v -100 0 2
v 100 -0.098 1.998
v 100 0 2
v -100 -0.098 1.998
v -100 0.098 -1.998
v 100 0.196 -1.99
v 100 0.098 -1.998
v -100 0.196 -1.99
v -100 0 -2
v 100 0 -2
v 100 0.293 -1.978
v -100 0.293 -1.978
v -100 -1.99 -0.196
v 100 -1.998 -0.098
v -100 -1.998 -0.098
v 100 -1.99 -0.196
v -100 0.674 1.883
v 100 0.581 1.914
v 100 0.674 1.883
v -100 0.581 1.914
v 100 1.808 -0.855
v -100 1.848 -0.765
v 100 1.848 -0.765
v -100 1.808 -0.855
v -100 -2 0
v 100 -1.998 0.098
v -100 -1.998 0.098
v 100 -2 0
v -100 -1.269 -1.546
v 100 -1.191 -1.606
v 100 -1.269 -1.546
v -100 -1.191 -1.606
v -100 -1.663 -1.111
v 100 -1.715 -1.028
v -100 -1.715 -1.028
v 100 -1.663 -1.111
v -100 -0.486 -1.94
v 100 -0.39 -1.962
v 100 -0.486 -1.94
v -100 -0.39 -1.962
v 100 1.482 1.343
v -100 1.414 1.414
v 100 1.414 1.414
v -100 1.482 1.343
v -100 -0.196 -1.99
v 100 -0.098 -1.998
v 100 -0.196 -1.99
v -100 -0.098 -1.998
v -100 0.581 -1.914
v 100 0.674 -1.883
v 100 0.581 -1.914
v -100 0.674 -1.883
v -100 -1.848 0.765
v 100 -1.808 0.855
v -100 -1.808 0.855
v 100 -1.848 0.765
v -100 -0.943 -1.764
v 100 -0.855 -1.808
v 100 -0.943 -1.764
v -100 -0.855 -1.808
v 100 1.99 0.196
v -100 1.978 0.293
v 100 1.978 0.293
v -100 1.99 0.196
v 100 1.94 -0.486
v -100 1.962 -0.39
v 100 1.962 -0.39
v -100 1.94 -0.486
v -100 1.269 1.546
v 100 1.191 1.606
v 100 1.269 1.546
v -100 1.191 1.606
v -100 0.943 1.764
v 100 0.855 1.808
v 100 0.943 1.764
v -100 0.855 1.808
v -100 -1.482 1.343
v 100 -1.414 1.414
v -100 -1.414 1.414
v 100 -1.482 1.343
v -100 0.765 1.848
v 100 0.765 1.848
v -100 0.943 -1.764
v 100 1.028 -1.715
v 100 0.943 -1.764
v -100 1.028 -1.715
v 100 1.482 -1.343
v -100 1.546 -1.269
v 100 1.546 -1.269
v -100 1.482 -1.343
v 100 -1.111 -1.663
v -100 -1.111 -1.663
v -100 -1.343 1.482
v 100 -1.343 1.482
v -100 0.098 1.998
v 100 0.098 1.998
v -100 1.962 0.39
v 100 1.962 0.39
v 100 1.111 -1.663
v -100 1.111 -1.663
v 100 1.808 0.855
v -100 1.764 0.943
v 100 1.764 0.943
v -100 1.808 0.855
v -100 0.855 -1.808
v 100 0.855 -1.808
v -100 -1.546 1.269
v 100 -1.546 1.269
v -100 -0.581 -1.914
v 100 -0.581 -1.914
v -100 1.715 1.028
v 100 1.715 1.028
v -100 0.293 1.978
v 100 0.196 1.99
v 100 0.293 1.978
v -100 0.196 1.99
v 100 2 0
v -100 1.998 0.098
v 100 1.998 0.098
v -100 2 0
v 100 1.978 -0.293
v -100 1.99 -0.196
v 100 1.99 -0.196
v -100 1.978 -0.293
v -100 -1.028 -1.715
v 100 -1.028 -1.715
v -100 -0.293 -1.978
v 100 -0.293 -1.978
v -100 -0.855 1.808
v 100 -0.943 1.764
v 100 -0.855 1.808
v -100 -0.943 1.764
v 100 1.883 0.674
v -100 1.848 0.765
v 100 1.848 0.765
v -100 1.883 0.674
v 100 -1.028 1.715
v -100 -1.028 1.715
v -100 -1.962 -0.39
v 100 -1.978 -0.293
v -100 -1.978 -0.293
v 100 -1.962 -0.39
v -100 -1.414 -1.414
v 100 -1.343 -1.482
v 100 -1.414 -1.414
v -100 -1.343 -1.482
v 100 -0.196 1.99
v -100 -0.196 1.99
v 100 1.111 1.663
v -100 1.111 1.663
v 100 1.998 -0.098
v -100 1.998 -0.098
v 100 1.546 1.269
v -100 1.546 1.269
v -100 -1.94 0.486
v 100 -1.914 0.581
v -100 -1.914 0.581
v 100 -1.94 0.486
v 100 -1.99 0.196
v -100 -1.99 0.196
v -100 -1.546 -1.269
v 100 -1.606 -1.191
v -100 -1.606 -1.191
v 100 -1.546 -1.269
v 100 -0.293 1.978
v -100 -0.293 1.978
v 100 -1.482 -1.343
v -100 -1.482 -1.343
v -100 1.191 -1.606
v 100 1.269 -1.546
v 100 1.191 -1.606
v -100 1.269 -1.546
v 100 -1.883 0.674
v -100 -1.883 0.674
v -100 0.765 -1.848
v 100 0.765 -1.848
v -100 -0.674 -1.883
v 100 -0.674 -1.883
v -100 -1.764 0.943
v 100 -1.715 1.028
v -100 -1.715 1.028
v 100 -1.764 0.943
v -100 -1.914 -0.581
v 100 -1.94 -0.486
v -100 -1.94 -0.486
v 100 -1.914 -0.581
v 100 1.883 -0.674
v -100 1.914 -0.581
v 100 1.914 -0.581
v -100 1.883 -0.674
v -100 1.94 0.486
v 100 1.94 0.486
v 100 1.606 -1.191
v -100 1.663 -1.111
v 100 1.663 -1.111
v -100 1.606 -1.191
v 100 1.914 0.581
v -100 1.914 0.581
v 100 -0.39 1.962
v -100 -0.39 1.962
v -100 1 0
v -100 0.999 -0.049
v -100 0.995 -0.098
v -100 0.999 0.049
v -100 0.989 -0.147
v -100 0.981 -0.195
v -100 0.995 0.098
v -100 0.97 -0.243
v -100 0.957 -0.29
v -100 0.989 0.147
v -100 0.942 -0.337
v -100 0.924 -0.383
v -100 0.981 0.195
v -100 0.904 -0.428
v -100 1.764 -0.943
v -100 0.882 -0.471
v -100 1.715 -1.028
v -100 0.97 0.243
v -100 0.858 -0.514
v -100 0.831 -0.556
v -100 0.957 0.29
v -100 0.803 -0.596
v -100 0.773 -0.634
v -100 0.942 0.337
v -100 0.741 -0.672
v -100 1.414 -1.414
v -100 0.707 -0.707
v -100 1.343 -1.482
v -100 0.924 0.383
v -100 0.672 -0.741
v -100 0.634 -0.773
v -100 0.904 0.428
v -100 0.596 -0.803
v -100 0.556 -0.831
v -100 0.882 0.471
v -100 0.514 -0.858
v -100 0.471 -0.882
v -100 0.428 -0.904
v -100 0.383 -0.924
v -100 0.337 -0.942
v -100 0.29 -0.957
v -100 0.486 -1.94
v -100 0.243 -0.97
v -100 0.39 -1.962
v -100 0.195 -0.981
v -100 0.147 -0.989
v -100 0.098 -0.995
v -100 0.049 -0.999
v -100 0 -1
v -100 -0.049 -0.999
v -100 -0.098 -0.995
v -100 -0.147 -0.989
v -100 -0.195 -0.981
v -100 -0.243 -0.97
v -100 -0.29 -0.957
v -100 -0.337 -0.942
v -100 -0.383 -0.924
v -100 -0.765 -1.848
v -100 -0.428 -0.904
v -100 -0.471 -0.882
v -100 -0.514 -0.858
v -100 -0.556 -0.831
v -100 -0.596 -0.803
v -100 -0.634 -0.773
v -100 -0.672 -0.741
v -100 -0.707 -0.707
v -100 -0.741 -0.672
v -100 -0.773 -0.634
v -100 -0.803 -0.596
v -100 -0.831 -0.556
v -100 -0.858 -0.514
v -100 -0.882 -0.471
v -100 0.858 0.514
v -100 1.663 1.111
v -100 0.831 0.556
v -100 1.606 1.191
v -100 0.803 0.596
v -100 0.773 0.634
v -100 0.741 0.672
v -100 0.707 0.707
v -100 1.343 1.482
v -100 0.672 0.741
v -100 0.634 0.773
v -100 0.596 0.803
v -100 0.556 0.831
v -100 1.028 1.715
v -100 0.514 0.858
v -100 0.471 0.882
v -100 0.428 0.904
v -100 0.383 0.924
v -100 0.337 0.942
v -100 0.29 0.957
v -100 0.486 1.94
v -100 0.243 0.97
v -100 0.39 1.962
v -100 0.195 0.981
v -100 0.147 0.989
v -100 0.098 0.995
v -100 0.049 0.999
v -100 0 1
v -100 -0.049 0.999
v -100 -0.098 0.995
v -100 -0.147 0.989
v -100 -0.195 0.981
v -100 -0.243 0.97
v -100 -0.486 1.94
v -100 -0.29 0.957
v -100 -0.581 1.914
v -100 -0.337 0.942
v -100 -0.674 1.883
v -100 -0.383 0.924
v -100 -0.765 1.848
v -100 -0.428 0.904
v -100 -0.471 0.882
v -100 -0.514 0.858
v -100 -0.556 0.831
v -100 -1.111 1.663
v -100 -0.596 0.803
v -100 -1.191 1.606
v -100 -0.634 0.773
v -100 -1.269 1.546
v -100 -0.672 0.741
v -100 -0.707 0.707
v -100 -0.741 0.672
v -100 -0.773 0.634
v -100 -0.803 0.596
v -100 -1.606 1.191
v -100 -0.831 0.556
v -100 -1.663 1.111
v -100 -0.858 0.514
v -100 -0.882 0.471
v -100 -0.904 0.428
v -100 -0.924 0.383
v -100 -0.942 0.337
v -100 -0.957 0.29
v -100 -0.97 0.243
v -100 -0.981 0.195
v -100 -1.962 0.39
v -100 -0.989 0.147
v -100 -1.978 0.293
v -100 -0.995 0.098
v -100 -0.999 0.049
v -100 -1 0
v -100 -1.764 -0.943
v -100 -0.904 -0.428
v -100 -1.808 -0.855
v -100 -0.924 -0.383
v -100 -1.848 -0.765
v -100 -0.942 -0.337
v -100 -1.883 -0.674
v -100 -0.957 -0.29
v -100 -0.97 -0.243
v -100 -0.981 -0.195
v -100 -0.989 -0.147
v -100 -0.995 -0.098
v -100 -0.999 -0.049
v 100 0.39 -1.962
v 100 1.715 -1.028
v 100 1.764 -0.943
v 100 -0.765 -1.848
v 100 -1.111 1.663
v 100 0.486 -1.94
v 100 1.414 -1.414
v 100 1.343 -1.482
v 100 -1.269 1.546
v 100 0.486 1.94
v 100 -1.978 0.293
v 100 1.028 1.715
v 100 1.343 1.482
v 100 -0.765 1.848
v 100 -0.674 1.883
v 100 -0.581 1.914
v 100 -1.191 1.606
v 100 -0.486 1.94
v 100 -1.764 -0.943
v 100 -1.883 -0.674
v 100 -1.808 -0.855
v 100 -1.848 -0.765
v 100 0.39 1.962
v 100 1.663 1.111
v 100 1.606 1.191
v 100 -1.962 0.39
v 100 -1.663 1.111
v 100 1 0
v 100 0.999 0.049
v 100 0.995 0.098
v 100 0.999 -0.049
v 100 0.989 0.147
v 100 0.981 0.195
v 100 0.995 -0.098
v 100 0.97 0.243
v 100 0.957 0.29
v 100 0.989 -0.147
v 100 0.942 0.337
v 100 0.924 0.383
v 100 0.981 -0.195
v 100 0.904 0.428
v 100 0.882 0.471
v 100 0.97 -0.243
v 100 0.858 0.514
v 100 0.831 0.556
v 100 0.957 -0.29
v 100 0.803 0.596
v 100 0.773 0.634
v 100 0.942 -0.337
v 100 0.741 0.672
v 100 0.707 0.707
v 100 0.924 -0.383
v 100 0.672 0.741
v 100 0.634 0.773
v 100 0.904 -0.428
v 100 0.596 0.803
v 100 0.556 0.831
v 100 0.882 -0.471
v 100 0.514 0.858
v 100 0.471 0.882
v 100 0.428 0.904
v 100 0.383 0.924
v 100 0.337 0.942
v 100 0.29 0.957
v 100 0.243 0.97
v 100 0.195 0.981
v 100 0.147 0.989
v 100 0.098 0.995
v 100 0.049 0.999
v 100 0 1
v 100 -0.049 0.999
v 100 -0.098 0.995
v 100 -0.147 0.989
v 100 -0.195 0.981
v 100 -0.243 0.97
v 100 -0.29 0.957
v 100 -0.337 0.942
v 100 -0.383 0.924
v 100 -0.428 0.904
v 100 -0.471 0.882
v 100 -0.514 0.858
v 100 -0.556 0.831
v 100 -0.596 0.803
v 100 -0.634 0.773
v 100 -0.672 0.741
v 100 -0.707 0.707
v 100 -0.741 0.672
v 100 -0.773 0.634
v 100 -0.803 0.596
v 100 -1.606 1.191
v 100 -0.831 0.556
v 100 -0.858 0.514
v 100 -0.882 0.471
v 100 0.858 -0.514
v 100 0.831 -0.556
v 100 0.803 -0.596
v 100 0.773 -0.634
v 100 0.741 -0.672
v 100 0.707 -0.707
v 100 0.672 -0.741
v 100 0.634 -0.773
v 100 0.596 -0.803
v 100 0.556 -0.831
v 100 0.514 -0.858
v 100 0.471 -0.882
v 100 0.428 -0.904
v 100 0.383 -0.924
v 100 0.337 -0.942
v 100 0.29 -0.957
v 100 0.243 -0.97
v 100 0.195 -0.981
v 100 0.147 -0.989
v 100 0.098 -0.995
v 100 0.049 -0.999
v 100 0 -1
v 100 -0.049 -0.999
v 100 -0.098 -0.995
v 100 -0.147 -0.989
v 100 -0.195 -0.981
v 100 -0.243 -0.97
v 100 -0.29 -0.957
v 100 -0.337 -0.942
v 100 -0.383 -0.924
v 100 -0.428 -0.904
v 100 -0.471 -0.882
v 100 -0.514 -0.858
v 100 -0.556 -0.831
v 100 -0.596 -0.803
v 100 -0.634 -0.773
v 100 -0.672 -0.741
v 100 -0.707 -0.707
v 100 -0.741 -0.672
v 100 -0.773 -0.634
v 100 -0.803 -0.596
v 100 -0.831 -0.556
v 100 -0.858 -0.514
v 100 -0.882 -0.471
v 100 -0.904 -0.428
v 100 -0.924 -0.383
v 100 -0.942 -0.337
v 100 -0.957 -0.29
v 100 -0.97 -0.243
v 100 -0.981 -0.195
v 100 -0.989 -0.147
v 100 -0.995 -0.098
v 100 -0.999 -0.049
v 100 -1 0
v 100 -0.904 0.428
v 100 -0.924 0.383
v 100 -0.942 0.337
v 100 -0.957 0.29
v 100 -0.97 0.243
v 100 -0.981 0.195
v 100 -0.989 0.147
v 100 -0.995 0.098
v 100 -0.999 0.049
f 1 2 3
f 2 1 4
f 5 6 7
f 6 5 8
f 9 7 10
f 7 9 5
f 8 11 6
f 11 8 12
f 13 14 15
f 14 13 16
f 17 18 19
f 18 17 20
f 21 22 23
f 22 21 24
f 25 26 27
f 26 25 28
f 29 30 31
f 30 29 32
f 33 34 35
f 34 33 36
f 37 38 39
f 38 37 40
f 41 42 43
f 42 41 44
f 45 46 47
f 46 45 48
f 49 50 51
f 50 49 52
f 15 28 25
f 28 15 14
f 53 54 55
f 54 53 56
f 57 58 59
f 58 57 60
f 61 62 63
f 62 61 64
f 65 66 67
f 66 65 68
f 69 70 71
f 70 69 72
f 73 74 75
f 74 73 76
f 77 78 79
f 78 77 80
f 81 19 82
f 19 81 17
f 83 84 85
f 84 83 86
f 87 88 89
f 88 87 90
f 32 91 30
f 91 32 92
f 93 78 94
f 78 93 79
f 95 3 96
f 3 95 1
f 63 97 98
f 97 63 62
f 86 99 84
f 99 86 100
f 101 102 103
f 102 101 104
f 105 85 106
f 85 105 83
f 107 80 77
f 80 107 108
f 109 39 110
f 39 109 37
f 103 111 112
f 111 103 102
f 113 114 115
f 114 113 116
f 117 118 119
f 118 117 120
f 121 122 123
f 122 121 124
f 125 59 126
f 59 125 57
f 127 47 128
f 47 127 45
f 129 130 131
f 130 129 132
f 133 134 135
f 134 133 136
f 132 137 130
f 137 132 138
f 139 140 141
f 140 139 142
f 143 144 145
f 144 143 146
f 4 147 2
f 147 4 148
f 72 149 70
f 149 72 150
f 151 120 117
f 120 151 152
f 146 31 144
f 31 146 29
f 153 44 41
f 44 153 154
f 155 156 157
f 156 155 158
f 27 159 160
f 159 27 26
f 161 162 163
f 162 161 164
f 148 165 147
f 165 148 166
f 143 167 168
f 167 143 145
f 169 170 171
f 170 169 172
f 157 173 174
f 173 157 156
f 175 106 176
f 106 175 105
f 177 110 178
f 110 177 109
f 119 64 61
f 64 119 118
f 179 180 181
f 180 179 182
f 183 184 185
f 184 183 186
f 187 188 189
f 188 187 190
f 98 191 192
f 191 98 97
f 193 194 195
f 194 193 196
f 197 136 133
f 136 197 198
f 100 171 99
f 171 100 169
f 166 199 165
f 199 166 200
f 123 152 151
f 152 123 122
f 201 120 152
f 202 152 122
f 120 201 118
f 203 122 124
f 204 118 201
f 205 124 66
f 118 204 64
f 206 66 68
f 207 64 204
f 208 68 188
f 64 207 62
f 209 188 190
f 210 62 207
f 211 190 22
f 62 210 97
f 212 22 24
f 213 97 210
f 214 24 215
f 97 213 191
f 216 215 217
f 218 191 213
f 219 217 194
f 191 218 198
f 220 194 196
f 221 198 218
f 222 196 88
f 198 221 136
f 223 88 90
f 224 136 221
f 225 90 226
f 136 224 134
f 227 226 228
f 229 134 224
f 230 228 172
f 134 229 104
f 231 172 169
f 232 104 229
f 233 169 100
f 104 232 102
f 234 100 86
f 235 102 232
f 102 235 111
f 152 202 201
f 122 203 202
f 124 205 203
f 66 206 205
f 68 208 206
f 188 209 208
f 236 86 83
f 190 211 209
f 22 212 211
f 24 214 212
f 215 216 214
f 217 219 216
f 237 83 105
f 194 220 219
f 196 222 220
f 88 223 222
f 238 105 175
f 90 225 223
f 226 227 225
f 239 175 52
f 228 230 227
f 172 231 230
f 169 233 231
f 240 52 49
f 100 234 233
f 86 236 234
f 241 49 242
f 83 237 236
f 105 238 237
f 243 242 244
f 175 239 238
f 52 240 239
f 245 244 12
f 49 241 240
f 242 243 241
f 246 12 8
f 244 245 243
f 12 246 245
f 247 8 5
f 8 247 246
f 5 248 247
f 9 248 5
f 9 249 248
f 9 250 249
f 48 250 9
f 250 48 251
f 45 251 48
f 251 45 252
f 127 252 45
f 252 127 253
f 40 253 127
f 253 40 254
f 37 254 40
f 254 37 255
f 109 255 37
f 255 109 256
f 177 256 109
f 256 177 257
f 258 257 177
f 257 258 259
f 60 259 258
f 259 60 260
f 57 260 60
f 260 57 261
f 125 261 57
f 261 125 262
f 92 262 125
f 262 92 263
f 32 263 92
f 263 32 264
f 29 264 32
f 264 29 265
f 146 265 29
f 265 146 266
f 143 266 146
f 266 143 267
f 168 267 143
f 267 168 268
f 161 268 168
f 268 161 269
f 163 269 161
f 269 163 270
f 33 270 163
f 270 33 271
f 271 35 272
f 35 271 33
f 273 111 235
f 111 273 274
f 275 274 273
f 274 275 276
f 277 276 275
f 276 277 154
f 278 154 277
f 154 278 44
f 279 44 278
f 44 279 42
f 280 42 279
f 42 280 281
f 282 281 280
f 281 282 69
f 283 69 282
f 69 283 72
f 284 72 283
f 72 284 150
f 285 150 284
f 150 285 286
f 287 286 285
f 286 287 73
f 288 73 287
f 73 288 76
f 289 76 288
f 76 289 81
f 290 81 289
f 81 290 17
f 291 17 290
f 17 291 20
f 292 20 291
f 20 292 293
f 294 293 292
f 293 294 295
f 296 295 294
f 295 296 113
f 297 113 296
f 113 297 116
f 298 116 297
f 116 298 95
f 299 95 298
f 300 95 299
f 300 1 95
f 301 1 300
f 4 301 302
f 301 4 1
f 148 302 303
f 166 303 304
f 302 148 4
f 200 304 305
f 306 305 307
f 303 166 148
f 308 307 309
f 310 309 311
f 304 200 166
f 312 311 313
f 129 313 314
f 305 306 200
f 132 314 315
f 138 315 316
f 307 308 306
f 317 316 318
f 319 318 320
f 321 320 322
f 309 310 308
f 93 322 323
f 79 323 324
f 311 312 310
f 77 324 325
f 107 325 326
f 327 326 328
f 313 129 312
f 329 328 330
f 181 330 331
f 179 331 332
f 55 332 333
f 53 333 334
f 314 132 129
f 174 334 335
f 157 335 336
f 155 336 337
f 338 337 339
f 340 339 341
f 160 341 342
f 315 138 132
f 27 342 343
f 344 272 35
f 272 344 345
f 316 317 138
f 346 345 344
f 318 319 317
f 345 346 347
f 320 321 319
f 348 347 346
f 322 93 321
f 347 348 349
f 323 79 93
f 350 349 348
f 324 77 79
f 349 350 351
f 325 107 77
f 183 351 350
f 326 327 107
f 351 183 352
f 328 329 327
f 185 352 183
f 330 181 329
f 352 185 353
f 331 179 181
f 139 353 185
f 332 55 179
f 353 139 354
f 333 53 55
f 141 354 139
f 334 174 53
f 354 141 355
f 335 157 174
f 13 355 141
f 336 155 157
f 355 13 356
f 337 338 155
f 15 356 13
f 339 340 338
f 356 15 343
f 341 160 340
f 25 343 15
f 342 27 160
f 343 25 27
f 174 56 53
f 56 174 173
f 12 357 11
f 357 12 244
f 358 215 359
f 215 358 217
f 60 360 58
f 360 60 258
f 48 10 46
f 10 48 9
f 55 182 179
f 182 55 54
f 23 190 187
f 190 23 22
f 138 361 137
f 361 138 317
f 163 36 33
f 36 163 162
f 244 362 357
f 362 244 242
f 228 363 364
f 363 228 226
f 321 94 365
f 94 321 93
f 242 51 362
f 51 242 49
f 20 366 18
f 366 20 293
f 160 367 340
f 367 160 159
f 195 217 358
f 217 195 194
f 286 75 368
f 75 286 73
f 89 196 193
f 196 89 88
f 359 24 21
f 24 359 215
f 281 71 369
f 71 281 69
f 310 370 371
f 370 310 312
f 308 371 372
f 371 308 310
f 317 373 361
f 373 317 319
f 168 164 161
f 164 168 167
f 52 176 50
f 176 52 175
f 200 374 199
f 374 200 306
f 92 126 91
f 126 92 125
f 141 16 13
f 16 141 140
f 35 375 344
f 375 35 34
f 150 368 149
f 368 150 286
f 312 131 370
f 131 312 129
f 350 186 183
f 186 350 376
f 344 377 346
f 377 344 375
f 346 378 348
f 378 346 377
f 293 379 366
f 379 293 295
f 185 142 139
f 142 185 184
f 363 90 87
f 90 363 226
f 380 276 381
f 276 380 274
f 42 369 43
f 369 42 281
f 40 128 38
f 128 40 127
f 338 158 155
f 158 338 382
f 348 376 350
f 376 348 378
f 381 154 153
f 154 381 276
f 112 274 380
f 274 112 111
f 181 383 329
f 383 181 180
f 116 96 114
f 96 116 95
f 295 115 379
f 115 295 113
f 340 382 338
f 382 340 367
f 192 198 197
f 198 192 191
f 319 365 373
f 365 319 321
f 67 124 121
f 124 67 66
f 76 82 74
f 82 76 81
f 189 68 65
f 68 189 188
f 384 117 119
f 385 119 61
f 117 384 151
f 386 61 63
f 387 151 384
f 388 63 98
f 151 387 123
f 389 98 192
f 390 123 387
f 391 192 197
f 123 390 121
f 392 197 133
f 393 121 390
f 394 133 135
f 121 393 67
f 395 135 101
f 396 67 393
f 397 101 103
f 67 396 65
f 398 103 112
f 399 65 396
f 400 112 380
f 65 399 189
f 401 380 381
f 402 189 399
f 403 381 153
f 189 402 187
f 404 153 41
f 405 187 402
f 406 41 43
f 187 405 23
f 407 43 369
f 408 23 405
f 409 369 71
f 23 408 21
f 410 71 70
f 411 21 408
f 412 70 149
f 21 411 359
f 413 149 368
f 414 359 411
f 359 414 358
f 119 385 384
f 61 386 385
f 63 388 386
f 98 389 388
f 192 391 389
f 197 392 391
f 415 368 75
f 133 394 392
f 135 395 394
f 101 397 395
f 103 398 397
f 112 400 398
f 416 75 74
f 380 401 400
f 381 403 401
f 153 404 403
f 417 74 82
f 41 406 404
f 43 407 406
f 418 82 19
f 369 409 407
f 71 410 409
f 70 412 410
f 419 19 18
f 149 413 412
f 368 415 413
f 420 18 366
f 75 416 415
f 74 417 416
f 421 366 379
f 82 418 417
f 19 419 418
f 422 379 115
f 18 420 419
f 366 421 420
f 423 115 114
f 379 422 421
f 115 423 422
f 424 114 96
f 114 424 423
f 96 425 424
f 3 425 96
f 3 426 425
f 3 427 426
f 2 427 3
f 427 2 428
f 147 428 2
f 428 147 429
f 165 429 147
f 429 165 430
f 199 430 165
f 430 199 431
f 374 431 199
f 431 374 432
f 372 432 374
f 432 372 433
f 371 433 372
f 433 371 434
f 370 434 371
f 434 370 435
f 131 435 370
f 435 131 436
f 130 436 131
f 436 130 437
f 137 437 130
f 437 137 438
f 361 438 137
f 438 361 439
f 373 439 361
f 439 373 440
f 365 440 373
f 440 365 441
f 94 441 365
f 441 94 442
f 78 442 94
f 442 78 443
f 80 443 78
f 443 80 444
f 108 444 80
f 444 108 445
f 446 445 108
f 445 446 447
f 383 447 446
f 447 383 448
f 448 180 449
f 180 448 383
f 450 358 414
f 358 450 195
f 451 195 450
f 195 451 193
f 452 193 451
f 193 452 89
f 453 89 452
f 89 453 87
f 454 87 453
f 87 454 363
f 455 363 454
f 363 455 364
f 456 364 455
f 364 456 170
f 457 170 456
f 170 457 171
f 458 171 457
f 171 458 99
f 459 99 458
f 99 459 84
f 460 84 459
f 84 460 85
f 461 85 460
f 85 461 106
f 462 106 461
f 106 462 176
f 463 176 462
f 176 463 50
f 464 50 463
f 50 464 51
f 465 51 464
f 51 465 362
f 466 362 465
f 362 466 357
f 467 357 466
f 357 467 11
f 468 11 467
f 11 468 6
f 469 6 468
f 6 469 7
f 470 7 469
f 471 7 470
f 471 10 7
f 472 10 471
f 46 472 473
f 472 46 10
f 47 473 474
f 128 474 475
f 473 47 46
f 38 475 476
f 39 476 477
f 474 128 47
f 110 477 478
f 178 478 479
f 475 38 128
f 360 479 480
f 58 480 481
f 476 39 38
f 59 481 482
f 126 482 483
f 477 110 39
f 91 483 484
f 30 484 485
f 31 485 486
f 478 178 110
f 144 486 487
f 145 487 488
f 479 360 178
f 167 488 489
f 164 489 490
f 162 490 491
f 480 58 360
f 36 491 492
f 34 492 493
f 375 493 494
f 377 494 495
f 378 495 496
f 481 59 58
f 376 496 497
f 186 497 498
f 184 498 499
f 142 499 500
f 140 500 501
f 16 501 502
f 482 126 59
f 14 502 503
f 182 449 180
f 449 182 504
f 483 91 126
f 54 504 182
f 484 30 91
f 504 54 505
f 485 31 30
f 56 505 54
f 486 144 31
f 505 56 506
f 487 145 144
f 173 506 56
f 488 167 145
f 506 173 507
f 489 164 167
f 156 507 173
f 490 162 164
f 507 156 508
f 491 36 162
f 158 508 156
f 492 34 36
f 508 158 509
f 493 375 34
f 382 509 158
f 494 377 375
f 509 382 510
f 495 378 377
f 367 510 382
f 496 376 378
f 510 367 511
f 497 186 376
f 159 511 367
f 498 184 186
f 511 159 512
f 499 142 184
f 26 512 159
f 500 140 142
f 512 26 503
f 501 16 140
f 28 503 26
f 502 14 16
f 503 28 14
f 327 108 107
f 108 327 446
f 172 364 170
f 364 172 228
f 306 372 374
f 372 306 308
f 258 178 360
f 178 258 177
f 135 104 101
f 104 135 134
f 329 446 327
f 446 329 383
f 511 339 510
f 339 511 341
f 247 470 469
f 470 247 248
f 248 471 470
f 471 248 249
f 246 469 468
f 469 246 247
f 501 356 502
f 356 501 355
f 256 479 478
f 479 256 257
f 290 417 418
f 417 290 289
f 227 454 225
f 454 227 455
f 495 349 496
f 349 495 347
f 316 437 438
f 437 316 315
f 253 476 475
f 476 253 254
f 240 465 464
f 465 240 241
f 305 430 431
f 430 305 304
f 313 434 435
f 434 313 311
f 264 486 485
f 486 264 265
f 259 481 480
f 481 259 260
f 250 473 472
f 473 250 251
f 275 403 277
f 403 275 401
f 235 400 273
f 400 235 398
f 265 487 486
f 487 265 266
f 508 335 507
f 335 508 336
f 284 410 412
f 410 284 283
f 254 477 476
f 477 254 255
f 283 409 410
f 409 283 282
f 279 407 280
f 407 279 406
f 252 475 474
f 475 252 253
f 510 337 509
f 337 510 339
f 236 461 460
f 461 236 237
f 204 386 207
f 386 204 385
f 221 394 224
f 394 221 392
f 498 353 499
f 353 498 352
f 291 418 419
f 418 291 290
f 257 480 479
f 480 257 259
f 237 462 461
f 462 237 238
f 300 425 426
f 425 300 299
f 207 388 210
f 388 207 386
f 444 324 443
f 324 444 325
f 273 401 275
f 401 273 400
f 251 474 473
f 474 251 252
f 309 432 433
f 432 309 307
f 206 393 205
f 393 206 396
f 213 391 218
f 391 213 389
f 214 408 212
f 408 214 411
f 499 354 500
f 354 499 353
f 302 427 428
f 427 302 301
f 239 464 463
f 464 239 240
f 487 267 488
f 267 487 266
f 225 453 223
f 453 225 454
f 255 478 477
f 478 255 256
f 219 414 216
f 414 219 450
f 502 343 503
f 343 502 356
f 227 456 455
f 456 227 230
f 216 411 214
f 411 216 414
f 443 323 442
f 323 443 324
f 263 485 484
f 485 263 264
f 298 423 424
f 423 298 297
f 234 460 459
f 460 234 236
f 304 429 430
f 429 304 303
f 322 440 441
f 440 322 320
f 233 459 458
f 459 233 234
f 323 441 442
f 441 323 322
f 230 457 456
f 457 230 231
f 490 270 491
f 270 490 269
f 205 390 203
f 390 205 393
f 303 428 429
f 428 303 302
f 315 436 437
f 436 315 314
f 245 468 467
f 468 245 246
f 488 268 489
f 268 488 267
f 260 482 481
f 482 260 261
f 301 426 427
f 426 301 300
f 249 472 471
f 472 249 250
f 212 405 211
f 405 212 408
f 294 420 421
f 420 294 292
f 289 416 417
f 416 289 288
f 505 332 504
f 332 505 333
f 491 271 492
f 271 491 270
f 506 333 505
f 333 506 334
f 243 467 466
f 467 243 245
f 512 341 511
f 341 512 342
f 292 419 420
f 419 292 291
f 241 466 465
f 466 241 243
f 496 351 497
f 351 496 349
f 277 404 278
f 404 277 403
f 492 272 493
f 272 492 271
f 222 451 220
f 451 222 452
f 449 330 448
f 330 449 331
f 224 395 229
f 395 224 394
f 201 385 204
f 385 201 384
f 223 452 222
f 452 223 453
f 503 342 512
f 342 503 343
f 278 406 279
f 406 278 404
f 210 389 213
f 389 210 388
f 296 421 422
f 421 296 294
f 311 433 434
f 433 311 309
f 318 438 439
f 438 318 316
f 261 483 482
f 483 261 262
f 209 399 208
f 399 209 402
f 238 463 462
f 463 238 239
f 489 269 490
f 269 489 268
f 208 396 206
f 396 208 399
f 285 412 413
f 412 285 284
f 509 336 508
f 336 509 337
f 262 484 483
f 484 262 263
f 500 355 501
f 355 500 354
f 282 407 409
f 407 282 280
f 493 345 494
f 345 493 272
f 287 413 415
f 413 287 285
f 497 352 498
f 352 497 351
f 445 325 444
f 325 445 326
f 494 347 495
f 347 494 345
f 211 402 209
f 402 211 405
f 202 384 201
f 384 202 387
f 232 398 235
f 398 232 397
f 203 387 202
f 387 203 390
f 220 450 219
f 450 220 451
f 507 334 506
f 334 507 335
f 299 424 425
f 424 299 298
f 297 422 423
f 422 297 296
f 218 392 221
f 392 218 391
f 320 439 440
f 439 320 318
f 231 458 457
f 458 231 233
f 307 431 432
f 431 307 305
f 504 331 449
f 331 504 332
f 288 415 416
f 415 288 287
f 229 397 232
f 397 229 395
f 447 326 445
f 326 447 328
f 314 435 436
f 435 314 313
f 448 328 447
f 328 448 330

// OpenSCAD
$fn = 128;

// PTFE tubing (hollow cylinder) - units: mm
outer_d = 4.0;     // OD
inner_d = 2.0;     // ID
length  = 200.0;   // tube length

module ptfe_tube(od, id, h) {
    eps = 0.05; // small overlap to ensure robust boolean

    // Orient tube along X so it is clearly visible in front/back/left/right views
    rotate([0, 90, 0])
        difference() {
            cylinder(d = od, h = h, center = true);
            cylinder(d = id, h = h + 2*eps, center = true);
        }
}

ptfe_tube(outer_d, inner_d, length);
